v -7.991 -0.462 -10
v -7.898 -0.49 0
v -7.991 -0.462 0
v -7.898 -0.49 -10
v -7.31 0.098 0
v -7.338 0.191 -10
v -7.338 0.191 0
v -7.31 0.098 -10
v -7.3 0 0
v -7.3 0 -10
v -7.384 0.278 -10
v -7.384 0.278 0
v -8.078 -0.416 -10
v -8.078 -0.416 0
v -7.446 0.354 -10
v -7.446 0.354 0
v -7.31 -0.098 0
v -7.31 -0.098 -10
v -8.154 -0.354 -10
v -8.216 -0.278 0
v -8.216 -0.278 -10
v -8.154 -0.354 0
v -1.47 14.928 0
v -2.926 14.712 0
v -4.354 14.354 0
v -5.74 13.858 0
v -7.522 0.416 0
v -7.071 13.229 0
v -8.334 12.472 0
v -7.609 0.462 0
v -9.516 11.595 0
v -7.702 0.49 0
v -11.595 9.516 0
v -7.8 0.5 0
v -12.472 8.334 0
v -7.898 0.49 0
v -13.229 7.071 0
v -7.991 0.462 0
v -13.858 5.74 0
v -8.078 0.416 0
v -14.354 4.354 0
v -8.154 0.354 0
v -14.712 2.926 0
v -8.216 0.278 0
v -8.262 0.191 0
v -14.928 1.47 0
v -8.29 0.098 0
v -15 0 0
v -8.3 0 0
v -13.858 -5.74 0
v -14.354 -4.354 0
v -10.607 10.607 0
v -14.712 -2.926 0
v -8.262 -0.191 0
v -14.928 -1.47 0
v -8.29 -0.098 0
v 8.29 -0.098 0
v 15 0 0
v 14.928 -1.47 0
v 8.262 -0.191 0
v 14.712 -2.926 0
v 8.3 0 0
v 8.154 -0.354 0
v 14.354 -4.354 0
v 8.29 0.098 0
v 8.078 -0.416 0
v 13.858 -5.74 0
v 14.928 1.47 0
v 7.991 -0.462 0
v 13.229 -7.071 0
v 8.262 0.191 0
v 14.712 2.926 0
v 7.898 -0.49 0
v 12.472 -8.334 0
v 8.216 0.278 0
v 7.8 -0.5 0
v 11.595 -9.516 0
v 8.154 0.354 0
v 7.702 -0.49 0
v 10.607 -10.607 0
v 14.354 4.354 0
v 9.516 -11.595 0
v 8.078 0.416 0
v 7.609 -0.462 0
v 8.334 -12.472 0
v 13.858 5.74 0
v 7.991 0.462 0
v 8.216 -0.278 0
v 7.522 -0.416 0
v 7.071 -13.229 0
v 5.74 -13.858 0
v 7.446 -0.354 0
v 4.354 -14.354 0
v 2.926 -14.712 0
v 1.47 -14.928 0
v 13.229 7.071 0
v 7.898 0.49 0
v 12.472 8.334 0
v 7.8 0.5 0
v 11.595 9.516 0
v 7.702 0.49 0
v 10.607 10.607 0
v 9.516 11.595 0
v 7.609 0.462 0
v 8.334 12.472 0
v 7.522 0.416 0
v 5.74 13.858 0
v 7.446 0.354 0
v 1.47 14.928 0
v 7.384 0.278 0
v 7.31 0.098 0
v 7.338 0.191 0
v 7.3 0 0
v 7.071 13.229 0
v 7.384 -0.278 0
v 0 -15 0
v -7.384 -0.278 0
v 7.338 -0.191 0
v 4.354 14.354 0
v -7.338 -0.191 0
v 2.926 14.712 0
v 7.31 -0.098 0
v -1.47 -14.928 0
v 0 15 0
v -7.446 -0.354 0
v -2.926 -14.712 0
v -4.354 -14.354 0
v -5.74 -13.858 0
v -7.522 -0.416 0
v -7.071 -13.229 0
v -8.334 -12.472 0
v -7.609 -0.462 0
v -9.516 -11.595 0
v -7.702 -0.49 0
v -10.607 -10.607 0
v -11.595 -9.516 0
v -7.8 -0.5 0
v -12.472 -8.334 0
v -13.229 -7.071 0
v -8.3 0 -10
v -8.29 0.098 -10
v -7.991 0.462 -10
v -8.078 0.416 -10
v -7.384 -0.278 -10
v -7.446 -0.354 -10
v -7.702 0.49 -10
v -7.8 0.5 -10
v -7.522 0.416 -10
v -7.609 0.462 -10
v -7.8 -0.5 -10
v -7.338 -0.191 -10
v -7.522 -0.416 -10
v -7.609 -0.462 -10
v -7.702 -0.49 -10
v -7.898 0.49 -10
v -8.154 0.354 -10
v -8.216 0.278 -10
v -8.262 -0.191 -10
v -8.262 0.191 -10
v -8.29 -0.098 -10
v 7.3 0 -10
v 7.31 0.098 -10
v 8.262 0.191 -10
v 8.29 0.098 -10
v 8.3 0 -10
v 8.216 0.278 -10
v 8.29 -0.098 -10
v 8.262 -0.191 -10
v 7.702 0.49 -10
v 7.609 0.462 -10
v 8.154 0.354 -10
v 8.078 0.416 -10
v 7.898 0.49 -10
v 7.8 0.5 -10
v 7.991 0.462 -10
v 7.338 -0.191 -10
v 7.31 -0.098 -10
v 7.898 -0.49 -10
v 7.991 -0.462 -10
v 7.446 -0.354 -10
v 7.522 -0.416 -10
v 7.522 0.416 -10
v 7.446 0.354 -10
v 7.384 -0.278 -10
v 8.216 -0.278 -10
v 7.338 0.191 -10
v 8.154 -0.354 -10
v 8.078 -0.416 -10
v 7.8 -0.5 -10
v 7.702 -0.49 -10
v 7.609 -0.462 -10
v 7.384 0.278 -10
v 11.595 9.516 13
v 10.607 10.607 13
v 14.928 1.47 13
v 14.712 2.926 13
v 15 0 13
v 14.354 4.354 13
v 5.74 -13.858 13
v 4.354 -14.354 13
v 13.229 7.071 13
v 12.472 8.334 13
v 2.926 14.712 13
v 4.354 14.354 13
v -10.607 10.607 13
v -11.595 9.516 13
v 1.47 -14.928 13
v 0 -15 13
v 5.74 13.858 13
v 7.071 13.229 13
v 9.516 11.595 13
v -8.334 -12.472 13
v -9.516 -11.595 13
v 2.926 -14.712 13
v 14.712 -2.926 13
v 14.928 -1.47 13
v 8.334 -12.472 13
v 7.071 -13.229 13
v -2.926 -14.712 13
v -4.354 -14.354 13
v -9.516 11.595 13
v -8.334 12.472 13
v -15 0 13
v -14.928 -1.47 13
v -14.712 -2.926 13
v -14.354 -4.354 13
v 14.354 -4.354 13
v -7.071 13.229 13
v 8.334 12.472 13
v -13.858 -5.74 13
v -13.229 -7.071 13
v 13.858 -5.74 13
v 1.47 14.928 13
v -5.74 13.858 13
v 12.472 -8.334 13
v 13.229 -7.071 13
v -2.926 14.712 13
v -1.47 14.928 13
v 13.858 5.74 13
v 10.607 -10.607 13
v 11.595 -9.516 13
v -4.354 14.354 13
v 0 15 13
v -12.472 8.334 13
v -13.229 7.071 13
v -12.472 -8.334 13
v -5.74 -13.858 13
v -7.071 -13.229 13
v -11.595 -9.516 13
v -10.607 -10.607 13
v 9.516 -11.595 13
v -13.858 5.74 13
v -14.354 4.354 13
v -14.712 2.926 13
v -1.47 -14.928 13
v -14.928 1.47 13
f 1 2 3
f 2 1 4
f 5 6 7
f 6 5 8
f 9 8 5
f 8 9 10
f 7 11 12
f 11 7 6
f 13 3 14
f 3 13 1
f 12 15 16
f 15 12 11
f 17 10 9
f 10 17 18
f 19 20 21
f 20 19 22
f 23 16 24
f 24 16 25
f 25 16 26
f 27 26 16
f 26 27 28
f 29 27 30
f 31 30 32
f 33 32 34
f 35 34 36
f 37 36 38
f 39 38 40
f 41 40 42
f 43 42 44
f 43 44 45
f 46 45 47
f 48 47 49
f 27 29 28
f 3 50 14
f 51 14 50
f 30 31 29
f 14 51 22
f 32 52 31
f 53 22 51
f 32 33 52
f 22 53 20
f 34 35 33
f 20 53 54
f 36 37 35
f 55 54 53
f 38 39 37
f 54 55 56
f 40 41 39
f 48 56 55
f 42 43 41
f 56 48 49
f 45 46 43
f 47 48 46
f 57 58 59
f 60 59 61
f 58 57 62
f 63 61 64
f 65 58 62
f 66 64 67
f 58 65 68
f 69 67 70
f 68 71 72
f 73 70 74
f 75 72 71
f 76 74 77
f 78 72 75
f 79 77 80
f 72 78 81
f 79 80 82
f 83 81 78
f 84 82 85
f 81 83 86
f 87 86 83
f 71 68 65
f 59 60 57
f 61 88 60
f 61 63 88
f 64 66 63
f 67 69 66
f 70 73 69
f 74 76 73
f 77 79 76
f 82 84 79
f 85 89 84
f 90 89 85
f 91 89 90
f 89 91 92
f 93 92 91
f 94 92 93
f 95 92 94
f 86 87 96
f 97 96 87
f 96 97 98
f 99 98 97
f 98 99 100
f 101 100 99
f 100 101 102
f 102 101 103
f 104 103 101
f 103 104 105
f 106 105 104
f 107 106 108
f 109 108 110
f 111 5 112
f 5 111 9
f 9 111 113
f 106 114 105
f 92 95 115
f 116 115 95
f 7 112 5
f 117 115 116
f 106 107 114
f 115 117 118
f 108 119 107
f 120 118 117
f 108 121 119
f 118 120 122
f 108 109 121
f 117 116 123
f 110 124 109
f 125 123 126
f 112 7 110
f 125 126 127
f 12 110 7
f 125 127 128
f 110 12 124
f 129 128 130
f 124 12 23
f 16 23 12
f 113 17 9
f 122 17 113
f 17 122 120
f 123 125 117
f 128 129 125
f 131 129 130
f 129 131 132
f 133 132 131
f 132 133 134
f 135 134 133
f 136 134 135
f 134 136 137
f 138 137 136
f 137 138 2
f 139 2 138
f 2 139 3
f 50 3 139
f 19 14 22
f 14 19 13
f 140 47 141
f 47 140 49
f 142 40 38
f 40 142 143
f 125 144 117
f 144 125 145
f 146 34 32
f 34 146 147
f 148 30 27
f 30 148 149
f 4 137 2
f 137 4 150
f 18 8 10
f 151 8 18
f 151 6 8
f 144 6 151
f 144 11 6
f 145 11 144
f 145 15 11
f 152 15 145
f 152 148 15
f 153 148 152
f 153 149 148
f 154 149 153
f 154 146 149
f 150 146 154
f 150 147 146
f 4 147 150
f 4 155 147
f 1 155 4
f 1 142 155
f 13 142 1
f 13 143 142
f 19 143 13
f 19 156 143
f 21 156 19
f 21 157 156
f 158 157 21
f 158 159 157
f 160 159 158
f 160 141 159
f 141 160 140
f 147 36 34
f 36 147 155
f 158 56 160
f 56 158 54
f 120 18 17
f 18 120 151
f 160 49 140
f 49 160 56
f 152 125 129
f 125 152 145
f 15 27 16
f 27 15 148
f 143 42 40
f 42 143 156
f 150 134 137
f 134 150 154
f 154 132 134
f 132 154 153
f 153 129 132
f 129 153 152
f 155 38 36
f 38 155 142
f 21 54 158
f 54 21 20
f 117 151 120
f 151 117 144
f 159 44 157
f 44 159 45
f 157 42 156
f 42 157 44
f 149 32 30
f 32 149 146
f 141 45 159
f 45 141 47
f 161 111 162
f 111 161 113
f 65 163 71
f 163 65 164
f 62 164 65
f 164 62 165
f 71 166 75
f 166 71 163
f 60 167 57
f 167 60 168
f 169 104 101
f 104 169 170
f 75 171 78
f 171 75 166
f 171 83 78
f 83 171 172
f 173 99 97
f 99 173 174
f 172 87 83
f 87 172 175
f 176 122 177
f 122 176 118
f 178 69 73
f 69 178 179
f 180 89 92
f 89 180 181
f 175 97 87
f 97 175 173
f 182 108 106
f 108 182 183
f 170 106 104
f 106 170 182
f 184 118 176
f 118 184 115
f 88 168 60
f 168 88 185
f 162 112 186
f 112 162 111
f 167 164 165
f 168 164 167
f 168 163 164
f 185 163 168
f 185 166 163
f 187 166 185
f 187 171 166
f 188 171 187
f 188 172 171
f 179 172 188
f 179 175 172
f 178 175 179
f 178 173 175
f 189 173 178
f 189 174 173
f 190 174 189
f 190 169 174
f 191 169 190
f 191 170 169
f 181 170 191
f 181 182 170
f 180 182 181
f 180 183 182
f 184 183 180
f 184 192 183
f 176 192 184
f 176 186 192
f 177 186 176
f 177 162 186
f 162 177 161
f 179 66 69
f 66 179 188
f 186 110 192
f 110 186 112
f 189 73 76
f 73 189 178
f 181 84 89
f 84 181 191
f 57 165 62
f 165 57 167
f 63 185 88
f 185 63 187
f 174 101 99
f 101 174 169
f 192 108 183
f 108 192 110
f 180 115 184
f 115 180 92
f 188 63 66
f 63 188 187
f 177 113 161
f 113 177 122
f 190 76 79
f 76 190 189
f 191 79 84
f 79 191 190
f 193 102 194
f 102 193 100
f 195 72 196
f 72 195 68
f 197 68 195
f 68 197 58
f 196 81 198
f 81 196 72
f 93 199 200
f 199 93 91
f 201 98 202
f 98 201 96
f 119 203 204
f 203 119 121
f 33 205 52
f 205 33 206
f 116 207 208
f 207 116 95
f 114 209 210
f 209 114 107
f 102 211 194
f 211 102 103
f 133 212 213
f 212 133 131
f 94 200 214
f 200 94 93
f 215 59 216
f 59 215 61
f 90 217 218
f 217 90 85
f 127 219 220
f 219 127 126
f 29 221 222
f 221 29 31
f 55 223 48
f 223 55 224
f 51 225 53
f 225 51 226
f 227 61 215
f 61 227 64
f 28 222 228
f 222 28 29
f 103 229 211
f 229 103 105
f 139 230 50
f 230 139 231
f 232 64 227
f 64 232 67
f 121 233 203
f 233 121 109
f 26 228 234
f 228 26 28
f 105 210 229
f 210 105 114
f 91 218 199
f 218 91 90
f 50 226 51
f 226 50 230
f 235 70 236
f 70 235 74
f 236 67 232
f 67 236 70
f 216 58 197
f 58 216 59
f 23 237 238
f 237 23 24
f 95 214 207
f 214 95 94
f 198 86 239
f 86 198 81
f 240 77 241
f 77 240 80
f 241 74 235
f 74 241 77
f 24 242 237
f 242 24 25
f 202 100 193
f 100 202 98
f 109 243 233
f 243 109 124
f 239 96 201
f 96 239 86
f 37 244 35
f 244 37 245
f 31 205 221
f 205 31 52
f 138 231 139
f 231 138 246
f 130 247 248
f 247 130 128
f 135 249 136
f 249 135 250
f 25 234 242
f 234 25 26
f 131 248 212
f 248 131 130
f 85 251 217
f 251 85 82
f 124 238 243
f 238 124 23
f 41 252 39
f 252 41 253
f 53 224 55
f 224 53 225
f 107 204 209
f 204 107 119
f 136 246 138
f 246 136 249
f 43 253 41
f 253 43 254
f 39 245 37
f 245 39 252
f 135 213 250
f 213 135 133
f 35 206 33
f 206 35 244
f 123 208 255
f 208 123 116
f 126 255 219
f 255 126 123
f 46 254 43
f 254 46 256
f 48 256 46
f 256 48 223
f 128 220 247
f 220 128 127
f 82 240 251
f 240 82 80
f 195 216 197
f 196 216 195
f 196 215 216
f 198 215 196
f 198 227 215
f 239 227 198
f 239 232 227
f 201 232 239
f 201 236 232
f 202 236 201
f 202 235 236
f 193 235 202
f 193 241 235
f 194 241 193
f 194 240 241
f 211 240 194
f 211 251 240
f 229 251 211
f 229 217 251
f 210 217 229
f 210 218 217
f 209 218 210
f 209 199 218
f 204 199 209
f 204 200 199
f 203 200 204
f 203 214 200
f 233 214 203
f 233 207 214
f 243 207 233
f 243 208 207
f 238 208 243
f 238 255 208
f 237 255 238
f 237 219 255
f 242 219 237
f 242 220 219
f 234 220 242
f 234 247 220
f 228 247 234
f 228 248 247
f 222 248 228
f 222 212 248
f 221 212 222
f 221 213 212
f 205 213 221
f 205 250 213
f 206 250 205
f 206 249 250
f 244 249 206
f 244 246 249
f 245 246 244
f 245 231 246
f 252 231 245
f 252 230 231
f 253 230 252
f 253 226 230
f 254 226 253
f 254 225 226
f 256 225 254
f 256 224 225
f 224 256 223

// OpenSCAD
// file: utils.scad
//-- General parts
//-- Ariel Burman
//-- Moorman Lab, University of Massachusetts Amherst
//-- v1.2 - April 2021

// screw to do differences
module screwM3(length,show=false){
  translate([0,0,-length-.005])cylinder(h=length+.1+.005,d=3.4,$fn=64);
  cylinder(h=4,d=6,$fn=64);
  if (show==true) {
    %translate([0,0,-length])cylinder(h=length,d=3.2,$fn=64);
    %cylinder(h=3,d=5.5,$fn=64);
    echo(str("M3 screw lenght: ", length, " mm"));
  }
}

// nut to do differences
module nutM3(rotation=0,show=false) {
  rotate([0,0,rotation])cylinder(h=2.6+.01,d=6.5,$fn=6,center=true);
  if (show==true) {
    %difference(){
      rotate([0,0,rotation])cylinder(h=2.6,d=6.4,$fn=6,center=true);
      cylinder(h=3,d=3.5,$fn=64,center=true);
    }
  }
}

module torus(d1,d2,fn=64){
  //d1: thickness of the torus
  //d2: middle diameter
  // external diameter = d2 + d1/2
  // internal diameter = d2 - d1/2
  
  assert (d1<=d2, str("ERROR d1 must not be greater than d2. d1 = ",d1,"| d2 = ",d2));
  rotate_extrude(convexity = 10,$fn=fn)
  translate([d2/2, 0, 0])
  circle(d=d1, $fn=fn);
}


module rrect(size,center=false,fn=64){

  dx = size[0];
  dy = size[1];
  dz = size[2];

  if (center==true)
    _rrect(size,fn);
  else
    translate([dx/2,dy/2,dz/2]) _rrect(size,fn);

  module _rrect(size,fn){
    d = min(dx,dy);
    a = (d == dx ? 0 : 1);
    
    hull()
      for(i=[-1,1]) 
        translate([a*i*(dx-d)/2,(1-a)*i*(dy-d)/2,0])
             cylinder(h=dz,d=d,$fn=fn,center=true);
  }

}  

module r2cube(size,center=false,r=0,fn=64){

  dx = size[0];
  dy = size[1];
  dz = size[2];

  assert(r>0,"Corner radius must be grater than 0 (otherwise just use cube)");
  assert(r<=min(dx,dy)/2,"Corner radius must not be greater than min(x,y)/2");

  if (center==true)
    _r2cube(size,r,fn);
  else
    translate([dx/2,dy/2,dz/2]) _r2cube(size,r,fn);
  
  module _r2cube(size,r,fn){
    
    hull()
      for(i=[-1,1]) 
        translate([i*(dx/2-r),0,0])
          rrect([2*r,dy,dz],fn=fn,center=true);

  }

}

module rcylinder2(h,r=0,d=0,center=false,fn=64){

  module _rcylinder2(h,d,fn){
      //cylinder(h=h-d,d=d,center=true,$fn=128);
      hull()
      for(i=[-1,1])translate([0,0,i*(-h/2+d/2)])rotate([0,90,0])sphere(d=d,$fn=64);
  }
  
  assert (r!=0 || d!=0);
  if (d==0) {
    assert (h>2*r,"h should be greater than 2*r");
    if (center==true)
      _rcylinder2(h,2*r,fn);
    else
      translate([0,0,h/2])_rcylinder2(h,2*r,fn);
  }
  else {
    if (r>0) echo("'rcylinder': when provinding 'd', 'r' is ignored");
    assert (h>d,"h should be greater than d");
    if (center==true)
      _rcylinder2(h,d,fn);
    else
      translate([0,0,h/2])_rcylinder2(h,d,fn);
  }
}


module rcylinder(h,r,rb,center=false,fn=64){
  module _rcylinder(h,r,rb,fn){
    hull(){
      translate([0,0,-h/2+rb/2])torus(rb,2*r-rb,fn);
      translate([0,0,h/2-rb/2])torus(rb,2*r-rb,fn);
    }
  }
  if (center==true)
    _rcylinder(h,r,rb,fn);
  else
    translate([0,0,h/2])_rcylinder(h,r,rb,fn);
}

module rhcylinder(h,rout,rin,rb,center=false,fn=64){
  //rounded hollow cylinder
  module _rhcylinder(h,rout,rin,rb,fn){
    difference(){
      union(){
      cylinder(h=h,d=2*rout-rb,$fn=fn,center=true);
      cylinder(h=h-rb,d=2*rout,$fn=fn,center=true);
      }
      cylinder(h=h-rb,d=2*rin,$fn=fn,center=true);
      translate([0,0,h/2])cylinder(h=rb+.1,d=2*rin+rb,$fn=fn,center=true);
      translate([0,0,-h/2])cylinder(h=rb+.1,d=2*rin+rb,$fn=fn,center=true);
    }
    translate([0,0,-h/2+rb/2])torus(rb,2*rout-rb,fn);
    translate([0,0,h/2-rb/2])torus(rb,2*rout-rb,fn);
    translate([0,0,-h/2+rb/2])torus(rb,2*rin+rb,fn);
    translate([0,0,h/2-rb/2])torus(rb,2*rin+rb,fn);
  }
  
  //do assertions
  assert(rout>rin);
  assert(rb<=(rout-rin));
  assert(h>=rb);

  if (center==true)
    _rhcylinder(h,rout,rin,rb,fn);
  else
    translate([0,0,h/2])_rhcylinder(h,rout,rin,rb,fn);
}

module r3cube(size,center=true,rc=0,rb=0,fn=32){
  
  
  module _r3cube(size,r,fn){
//    hull(){
//      for(i=[-1,1]) 
//        for(j=[-1,1])
//          for(k=[-1,1])
//          translate([i*(dx/2-r),j*(dy/2-r),k*(dz/2-r)]) sphere(r=r,$fn=32);
//    }

     hull(){
      for(k=[-1,1]) translate([0,0,k*(dz/2-r)])
        hull(){
          for(j=[-1,1])translate([0,j*(dy/2-r),0])
            hull(){
              for(i=[-1,1])
                translate([i*(dx/2-r),0,0]) sphere(r=r,$fn=fn);
            }
        }
     }

  }

  module _r3cube(size,r,fn){
//    hull(){
//      for(i=[-1,1]) 
//        for(j=[-1,1])
//          for(k=[-1,1])
//          translate([i*(dx/2-r),j*(dy/2-r),k*(dz/2-r)]) sphere(r=r,$fn=32);
//    }

     hull(){
      for(k=[-1,1]) translate([0,0,k*(dz/2-r)])
        hull(){
          for(j=[-1,1])translate([0,j*(dy/2-r),0])
            hull(){
              for(i=[-1,1])
                translate([i*(dx/2-r),0,0]) sphere(r=r,$fn=fn);
            }
        }
     }

  }
  

  
  dx = size[0];
  dy = size[1];
  dz = size[2];
  assert (rc>0,"Missing radius value rc");
  if (rb==0){
    //same radius for all corners and edges;
    assert (rc<=min(dx,dy,dz)/2,"Corner radius must not be greater than min(x,y,z)/2");
    
    if (center==true)
      _r3cube(size,rc,fn);
    else
      translate([dx/2,dy/2,dz/2]);
  }
  else {
  //assert (rb>0,"Missing radius value rb");
    assert (rc<=min(dx,dy)/2,"Corner radius must not be greater than min(x,y)/2");
    assert (rb<dz/2,"Border radius must not be greater than z/2");

    if (center==true)
      _r3bcube(size,rc,fn);
    else
      translate([dx/2,dy/2,dz/2]);
  }
}



difference(){
  cube(12,center=true);
  !translate([0,0,5])screwM3(11,show=true);
  translate([0,0,-4.7])nutM3(rotation=0,show=true);
}
//translate([10,10,0])
*torus(1,20-1,64);

*rrect([10,5,2],center=false,fn=1024);
*r2cube([15,21,2],r=3,fn=64,center=false);
*r3cube([20,15,5],rc=2);
*rcylinder(h=10,r=10,rb=4,center=false,fn=64);
*rcylinder(h=10,r=2,rb=2,center=false,fn=64);
*rcylinder2(h=10,d=3,r=2,center=true,fn=64);
*rhcylinder(h=15,rout=14,rin=8,rb=2,center=true,fn=128);
// main file
//-- IR Sensors
//-- Ariel Burman 
//-- Moorman Lab, University of Massachusetts Amherst
//-- v1.0 - April 2021

use <utils.scad>;

*adafruitSensorCase(W=12,show=true);
*sparkfunSensorCase(W=8,show=true,depth=8);
*sparkfunIR();
sparkfunSpeaker();


module adafruitIRsensor(){
  translate([4,0,0])r2cube([12,10,8],r=1.5,fn=32,center=true);
  translate([-4,0,0])cube([12,10,8],center=true);
  translate([5,0,4])cylinder(h=0.6,d=8,$fn=64);
  translate([5,0,4])cylinder(h=1,d=3,$fn=64);
  translate([5,0,5])sphere(d=3,$fn=64);
}

module adafruitSensorCase(W=6,show=false){
  //difference(){
    translate([0,-5,0])
    union(){
      //translate([0,0,0])cube([53,5,25],center=true);
      for(i=[0,1])mirror([i,0,0])
        {
        translate([W/2,0,0])difference(){
          r2cube([10,20,13],r=1.5,fn=64,center=false);
          translate([1.6,-1.25,1.25])cube([10,20,10.5]);
          translate([9,-1.25,-.5])cube([2,22,14]);
          translate([-1,-1.25,-.5])cube([12,6,14]);
          
          translate([1,20-1.5-4-1,13/2])rotate([0,90,0])cylinder(h=0.65,d=8,$fn=64);
          translate([-.1,20-1.5-4-1,13/2])rotate([0,90,0])cylinder(h=1.2,d=3,$fn=32);
        }
        if (show)  %translate([W/2+5.6,8.5,5+1.5])rotate([-90,0,90])adafruitIRsensor();
      }
      translate([0,5.75,13/2])cube([W+.2,2,13],center=true);
    }
}

module sparkfunIR(){
  cube([4.4,1.5,5.7], center=true);
  translate([0,.75,5.7/2-1.22])sphere(r=.75,$fn=64);
  translate([ 1.27, 0,(-12.7-5.7)/2])cube([.5,.5,12.7],center=true);
  translate([-1.27, 0,(-12.7-5.7)/2])cube([.5,.5,12.7],center=true);
}

module sparkfunSensorCase(W=6,depth=8,show=false){
  D = depth;
  assert (depth >= 4);
  for(i=[0,1])mirror([i,0,0])translate([W/2,0,0])translate([2,0,0]){
    difference(){
      translate([0,0,0])r2cube([4,depth+1,5.8],r=1,fn=64,center=true);
      translate([.75,0,0])cube([3,depth,4.8],center=true);
      translate([2,0,0])cube([2,depth+2,6],center=true);
      translate([0,-depth/2-.5,0])cube([6,2,6],center=true);
          
      translate([-2.1,depth/2-1.22,0])rotate([0,90,0])cylinder(h=2,d=1.53,$fn=32);
    }
    if (show) %translate([0,-5.7/2+depth/2,0])rotate([-90,90,0])sparkfunIR();
  }
  translate([0,-depth/2+1,0])cube([W+1,1,5.8],center=true);
}

module sparkfunSpeaker() {
  cylinder(h=13,d=30,$fn=64);
  for(i=[-1,1])translate([i*7.8,0,-5]) cylinder(h=10,d=1,$fn=32,center=true);
}
